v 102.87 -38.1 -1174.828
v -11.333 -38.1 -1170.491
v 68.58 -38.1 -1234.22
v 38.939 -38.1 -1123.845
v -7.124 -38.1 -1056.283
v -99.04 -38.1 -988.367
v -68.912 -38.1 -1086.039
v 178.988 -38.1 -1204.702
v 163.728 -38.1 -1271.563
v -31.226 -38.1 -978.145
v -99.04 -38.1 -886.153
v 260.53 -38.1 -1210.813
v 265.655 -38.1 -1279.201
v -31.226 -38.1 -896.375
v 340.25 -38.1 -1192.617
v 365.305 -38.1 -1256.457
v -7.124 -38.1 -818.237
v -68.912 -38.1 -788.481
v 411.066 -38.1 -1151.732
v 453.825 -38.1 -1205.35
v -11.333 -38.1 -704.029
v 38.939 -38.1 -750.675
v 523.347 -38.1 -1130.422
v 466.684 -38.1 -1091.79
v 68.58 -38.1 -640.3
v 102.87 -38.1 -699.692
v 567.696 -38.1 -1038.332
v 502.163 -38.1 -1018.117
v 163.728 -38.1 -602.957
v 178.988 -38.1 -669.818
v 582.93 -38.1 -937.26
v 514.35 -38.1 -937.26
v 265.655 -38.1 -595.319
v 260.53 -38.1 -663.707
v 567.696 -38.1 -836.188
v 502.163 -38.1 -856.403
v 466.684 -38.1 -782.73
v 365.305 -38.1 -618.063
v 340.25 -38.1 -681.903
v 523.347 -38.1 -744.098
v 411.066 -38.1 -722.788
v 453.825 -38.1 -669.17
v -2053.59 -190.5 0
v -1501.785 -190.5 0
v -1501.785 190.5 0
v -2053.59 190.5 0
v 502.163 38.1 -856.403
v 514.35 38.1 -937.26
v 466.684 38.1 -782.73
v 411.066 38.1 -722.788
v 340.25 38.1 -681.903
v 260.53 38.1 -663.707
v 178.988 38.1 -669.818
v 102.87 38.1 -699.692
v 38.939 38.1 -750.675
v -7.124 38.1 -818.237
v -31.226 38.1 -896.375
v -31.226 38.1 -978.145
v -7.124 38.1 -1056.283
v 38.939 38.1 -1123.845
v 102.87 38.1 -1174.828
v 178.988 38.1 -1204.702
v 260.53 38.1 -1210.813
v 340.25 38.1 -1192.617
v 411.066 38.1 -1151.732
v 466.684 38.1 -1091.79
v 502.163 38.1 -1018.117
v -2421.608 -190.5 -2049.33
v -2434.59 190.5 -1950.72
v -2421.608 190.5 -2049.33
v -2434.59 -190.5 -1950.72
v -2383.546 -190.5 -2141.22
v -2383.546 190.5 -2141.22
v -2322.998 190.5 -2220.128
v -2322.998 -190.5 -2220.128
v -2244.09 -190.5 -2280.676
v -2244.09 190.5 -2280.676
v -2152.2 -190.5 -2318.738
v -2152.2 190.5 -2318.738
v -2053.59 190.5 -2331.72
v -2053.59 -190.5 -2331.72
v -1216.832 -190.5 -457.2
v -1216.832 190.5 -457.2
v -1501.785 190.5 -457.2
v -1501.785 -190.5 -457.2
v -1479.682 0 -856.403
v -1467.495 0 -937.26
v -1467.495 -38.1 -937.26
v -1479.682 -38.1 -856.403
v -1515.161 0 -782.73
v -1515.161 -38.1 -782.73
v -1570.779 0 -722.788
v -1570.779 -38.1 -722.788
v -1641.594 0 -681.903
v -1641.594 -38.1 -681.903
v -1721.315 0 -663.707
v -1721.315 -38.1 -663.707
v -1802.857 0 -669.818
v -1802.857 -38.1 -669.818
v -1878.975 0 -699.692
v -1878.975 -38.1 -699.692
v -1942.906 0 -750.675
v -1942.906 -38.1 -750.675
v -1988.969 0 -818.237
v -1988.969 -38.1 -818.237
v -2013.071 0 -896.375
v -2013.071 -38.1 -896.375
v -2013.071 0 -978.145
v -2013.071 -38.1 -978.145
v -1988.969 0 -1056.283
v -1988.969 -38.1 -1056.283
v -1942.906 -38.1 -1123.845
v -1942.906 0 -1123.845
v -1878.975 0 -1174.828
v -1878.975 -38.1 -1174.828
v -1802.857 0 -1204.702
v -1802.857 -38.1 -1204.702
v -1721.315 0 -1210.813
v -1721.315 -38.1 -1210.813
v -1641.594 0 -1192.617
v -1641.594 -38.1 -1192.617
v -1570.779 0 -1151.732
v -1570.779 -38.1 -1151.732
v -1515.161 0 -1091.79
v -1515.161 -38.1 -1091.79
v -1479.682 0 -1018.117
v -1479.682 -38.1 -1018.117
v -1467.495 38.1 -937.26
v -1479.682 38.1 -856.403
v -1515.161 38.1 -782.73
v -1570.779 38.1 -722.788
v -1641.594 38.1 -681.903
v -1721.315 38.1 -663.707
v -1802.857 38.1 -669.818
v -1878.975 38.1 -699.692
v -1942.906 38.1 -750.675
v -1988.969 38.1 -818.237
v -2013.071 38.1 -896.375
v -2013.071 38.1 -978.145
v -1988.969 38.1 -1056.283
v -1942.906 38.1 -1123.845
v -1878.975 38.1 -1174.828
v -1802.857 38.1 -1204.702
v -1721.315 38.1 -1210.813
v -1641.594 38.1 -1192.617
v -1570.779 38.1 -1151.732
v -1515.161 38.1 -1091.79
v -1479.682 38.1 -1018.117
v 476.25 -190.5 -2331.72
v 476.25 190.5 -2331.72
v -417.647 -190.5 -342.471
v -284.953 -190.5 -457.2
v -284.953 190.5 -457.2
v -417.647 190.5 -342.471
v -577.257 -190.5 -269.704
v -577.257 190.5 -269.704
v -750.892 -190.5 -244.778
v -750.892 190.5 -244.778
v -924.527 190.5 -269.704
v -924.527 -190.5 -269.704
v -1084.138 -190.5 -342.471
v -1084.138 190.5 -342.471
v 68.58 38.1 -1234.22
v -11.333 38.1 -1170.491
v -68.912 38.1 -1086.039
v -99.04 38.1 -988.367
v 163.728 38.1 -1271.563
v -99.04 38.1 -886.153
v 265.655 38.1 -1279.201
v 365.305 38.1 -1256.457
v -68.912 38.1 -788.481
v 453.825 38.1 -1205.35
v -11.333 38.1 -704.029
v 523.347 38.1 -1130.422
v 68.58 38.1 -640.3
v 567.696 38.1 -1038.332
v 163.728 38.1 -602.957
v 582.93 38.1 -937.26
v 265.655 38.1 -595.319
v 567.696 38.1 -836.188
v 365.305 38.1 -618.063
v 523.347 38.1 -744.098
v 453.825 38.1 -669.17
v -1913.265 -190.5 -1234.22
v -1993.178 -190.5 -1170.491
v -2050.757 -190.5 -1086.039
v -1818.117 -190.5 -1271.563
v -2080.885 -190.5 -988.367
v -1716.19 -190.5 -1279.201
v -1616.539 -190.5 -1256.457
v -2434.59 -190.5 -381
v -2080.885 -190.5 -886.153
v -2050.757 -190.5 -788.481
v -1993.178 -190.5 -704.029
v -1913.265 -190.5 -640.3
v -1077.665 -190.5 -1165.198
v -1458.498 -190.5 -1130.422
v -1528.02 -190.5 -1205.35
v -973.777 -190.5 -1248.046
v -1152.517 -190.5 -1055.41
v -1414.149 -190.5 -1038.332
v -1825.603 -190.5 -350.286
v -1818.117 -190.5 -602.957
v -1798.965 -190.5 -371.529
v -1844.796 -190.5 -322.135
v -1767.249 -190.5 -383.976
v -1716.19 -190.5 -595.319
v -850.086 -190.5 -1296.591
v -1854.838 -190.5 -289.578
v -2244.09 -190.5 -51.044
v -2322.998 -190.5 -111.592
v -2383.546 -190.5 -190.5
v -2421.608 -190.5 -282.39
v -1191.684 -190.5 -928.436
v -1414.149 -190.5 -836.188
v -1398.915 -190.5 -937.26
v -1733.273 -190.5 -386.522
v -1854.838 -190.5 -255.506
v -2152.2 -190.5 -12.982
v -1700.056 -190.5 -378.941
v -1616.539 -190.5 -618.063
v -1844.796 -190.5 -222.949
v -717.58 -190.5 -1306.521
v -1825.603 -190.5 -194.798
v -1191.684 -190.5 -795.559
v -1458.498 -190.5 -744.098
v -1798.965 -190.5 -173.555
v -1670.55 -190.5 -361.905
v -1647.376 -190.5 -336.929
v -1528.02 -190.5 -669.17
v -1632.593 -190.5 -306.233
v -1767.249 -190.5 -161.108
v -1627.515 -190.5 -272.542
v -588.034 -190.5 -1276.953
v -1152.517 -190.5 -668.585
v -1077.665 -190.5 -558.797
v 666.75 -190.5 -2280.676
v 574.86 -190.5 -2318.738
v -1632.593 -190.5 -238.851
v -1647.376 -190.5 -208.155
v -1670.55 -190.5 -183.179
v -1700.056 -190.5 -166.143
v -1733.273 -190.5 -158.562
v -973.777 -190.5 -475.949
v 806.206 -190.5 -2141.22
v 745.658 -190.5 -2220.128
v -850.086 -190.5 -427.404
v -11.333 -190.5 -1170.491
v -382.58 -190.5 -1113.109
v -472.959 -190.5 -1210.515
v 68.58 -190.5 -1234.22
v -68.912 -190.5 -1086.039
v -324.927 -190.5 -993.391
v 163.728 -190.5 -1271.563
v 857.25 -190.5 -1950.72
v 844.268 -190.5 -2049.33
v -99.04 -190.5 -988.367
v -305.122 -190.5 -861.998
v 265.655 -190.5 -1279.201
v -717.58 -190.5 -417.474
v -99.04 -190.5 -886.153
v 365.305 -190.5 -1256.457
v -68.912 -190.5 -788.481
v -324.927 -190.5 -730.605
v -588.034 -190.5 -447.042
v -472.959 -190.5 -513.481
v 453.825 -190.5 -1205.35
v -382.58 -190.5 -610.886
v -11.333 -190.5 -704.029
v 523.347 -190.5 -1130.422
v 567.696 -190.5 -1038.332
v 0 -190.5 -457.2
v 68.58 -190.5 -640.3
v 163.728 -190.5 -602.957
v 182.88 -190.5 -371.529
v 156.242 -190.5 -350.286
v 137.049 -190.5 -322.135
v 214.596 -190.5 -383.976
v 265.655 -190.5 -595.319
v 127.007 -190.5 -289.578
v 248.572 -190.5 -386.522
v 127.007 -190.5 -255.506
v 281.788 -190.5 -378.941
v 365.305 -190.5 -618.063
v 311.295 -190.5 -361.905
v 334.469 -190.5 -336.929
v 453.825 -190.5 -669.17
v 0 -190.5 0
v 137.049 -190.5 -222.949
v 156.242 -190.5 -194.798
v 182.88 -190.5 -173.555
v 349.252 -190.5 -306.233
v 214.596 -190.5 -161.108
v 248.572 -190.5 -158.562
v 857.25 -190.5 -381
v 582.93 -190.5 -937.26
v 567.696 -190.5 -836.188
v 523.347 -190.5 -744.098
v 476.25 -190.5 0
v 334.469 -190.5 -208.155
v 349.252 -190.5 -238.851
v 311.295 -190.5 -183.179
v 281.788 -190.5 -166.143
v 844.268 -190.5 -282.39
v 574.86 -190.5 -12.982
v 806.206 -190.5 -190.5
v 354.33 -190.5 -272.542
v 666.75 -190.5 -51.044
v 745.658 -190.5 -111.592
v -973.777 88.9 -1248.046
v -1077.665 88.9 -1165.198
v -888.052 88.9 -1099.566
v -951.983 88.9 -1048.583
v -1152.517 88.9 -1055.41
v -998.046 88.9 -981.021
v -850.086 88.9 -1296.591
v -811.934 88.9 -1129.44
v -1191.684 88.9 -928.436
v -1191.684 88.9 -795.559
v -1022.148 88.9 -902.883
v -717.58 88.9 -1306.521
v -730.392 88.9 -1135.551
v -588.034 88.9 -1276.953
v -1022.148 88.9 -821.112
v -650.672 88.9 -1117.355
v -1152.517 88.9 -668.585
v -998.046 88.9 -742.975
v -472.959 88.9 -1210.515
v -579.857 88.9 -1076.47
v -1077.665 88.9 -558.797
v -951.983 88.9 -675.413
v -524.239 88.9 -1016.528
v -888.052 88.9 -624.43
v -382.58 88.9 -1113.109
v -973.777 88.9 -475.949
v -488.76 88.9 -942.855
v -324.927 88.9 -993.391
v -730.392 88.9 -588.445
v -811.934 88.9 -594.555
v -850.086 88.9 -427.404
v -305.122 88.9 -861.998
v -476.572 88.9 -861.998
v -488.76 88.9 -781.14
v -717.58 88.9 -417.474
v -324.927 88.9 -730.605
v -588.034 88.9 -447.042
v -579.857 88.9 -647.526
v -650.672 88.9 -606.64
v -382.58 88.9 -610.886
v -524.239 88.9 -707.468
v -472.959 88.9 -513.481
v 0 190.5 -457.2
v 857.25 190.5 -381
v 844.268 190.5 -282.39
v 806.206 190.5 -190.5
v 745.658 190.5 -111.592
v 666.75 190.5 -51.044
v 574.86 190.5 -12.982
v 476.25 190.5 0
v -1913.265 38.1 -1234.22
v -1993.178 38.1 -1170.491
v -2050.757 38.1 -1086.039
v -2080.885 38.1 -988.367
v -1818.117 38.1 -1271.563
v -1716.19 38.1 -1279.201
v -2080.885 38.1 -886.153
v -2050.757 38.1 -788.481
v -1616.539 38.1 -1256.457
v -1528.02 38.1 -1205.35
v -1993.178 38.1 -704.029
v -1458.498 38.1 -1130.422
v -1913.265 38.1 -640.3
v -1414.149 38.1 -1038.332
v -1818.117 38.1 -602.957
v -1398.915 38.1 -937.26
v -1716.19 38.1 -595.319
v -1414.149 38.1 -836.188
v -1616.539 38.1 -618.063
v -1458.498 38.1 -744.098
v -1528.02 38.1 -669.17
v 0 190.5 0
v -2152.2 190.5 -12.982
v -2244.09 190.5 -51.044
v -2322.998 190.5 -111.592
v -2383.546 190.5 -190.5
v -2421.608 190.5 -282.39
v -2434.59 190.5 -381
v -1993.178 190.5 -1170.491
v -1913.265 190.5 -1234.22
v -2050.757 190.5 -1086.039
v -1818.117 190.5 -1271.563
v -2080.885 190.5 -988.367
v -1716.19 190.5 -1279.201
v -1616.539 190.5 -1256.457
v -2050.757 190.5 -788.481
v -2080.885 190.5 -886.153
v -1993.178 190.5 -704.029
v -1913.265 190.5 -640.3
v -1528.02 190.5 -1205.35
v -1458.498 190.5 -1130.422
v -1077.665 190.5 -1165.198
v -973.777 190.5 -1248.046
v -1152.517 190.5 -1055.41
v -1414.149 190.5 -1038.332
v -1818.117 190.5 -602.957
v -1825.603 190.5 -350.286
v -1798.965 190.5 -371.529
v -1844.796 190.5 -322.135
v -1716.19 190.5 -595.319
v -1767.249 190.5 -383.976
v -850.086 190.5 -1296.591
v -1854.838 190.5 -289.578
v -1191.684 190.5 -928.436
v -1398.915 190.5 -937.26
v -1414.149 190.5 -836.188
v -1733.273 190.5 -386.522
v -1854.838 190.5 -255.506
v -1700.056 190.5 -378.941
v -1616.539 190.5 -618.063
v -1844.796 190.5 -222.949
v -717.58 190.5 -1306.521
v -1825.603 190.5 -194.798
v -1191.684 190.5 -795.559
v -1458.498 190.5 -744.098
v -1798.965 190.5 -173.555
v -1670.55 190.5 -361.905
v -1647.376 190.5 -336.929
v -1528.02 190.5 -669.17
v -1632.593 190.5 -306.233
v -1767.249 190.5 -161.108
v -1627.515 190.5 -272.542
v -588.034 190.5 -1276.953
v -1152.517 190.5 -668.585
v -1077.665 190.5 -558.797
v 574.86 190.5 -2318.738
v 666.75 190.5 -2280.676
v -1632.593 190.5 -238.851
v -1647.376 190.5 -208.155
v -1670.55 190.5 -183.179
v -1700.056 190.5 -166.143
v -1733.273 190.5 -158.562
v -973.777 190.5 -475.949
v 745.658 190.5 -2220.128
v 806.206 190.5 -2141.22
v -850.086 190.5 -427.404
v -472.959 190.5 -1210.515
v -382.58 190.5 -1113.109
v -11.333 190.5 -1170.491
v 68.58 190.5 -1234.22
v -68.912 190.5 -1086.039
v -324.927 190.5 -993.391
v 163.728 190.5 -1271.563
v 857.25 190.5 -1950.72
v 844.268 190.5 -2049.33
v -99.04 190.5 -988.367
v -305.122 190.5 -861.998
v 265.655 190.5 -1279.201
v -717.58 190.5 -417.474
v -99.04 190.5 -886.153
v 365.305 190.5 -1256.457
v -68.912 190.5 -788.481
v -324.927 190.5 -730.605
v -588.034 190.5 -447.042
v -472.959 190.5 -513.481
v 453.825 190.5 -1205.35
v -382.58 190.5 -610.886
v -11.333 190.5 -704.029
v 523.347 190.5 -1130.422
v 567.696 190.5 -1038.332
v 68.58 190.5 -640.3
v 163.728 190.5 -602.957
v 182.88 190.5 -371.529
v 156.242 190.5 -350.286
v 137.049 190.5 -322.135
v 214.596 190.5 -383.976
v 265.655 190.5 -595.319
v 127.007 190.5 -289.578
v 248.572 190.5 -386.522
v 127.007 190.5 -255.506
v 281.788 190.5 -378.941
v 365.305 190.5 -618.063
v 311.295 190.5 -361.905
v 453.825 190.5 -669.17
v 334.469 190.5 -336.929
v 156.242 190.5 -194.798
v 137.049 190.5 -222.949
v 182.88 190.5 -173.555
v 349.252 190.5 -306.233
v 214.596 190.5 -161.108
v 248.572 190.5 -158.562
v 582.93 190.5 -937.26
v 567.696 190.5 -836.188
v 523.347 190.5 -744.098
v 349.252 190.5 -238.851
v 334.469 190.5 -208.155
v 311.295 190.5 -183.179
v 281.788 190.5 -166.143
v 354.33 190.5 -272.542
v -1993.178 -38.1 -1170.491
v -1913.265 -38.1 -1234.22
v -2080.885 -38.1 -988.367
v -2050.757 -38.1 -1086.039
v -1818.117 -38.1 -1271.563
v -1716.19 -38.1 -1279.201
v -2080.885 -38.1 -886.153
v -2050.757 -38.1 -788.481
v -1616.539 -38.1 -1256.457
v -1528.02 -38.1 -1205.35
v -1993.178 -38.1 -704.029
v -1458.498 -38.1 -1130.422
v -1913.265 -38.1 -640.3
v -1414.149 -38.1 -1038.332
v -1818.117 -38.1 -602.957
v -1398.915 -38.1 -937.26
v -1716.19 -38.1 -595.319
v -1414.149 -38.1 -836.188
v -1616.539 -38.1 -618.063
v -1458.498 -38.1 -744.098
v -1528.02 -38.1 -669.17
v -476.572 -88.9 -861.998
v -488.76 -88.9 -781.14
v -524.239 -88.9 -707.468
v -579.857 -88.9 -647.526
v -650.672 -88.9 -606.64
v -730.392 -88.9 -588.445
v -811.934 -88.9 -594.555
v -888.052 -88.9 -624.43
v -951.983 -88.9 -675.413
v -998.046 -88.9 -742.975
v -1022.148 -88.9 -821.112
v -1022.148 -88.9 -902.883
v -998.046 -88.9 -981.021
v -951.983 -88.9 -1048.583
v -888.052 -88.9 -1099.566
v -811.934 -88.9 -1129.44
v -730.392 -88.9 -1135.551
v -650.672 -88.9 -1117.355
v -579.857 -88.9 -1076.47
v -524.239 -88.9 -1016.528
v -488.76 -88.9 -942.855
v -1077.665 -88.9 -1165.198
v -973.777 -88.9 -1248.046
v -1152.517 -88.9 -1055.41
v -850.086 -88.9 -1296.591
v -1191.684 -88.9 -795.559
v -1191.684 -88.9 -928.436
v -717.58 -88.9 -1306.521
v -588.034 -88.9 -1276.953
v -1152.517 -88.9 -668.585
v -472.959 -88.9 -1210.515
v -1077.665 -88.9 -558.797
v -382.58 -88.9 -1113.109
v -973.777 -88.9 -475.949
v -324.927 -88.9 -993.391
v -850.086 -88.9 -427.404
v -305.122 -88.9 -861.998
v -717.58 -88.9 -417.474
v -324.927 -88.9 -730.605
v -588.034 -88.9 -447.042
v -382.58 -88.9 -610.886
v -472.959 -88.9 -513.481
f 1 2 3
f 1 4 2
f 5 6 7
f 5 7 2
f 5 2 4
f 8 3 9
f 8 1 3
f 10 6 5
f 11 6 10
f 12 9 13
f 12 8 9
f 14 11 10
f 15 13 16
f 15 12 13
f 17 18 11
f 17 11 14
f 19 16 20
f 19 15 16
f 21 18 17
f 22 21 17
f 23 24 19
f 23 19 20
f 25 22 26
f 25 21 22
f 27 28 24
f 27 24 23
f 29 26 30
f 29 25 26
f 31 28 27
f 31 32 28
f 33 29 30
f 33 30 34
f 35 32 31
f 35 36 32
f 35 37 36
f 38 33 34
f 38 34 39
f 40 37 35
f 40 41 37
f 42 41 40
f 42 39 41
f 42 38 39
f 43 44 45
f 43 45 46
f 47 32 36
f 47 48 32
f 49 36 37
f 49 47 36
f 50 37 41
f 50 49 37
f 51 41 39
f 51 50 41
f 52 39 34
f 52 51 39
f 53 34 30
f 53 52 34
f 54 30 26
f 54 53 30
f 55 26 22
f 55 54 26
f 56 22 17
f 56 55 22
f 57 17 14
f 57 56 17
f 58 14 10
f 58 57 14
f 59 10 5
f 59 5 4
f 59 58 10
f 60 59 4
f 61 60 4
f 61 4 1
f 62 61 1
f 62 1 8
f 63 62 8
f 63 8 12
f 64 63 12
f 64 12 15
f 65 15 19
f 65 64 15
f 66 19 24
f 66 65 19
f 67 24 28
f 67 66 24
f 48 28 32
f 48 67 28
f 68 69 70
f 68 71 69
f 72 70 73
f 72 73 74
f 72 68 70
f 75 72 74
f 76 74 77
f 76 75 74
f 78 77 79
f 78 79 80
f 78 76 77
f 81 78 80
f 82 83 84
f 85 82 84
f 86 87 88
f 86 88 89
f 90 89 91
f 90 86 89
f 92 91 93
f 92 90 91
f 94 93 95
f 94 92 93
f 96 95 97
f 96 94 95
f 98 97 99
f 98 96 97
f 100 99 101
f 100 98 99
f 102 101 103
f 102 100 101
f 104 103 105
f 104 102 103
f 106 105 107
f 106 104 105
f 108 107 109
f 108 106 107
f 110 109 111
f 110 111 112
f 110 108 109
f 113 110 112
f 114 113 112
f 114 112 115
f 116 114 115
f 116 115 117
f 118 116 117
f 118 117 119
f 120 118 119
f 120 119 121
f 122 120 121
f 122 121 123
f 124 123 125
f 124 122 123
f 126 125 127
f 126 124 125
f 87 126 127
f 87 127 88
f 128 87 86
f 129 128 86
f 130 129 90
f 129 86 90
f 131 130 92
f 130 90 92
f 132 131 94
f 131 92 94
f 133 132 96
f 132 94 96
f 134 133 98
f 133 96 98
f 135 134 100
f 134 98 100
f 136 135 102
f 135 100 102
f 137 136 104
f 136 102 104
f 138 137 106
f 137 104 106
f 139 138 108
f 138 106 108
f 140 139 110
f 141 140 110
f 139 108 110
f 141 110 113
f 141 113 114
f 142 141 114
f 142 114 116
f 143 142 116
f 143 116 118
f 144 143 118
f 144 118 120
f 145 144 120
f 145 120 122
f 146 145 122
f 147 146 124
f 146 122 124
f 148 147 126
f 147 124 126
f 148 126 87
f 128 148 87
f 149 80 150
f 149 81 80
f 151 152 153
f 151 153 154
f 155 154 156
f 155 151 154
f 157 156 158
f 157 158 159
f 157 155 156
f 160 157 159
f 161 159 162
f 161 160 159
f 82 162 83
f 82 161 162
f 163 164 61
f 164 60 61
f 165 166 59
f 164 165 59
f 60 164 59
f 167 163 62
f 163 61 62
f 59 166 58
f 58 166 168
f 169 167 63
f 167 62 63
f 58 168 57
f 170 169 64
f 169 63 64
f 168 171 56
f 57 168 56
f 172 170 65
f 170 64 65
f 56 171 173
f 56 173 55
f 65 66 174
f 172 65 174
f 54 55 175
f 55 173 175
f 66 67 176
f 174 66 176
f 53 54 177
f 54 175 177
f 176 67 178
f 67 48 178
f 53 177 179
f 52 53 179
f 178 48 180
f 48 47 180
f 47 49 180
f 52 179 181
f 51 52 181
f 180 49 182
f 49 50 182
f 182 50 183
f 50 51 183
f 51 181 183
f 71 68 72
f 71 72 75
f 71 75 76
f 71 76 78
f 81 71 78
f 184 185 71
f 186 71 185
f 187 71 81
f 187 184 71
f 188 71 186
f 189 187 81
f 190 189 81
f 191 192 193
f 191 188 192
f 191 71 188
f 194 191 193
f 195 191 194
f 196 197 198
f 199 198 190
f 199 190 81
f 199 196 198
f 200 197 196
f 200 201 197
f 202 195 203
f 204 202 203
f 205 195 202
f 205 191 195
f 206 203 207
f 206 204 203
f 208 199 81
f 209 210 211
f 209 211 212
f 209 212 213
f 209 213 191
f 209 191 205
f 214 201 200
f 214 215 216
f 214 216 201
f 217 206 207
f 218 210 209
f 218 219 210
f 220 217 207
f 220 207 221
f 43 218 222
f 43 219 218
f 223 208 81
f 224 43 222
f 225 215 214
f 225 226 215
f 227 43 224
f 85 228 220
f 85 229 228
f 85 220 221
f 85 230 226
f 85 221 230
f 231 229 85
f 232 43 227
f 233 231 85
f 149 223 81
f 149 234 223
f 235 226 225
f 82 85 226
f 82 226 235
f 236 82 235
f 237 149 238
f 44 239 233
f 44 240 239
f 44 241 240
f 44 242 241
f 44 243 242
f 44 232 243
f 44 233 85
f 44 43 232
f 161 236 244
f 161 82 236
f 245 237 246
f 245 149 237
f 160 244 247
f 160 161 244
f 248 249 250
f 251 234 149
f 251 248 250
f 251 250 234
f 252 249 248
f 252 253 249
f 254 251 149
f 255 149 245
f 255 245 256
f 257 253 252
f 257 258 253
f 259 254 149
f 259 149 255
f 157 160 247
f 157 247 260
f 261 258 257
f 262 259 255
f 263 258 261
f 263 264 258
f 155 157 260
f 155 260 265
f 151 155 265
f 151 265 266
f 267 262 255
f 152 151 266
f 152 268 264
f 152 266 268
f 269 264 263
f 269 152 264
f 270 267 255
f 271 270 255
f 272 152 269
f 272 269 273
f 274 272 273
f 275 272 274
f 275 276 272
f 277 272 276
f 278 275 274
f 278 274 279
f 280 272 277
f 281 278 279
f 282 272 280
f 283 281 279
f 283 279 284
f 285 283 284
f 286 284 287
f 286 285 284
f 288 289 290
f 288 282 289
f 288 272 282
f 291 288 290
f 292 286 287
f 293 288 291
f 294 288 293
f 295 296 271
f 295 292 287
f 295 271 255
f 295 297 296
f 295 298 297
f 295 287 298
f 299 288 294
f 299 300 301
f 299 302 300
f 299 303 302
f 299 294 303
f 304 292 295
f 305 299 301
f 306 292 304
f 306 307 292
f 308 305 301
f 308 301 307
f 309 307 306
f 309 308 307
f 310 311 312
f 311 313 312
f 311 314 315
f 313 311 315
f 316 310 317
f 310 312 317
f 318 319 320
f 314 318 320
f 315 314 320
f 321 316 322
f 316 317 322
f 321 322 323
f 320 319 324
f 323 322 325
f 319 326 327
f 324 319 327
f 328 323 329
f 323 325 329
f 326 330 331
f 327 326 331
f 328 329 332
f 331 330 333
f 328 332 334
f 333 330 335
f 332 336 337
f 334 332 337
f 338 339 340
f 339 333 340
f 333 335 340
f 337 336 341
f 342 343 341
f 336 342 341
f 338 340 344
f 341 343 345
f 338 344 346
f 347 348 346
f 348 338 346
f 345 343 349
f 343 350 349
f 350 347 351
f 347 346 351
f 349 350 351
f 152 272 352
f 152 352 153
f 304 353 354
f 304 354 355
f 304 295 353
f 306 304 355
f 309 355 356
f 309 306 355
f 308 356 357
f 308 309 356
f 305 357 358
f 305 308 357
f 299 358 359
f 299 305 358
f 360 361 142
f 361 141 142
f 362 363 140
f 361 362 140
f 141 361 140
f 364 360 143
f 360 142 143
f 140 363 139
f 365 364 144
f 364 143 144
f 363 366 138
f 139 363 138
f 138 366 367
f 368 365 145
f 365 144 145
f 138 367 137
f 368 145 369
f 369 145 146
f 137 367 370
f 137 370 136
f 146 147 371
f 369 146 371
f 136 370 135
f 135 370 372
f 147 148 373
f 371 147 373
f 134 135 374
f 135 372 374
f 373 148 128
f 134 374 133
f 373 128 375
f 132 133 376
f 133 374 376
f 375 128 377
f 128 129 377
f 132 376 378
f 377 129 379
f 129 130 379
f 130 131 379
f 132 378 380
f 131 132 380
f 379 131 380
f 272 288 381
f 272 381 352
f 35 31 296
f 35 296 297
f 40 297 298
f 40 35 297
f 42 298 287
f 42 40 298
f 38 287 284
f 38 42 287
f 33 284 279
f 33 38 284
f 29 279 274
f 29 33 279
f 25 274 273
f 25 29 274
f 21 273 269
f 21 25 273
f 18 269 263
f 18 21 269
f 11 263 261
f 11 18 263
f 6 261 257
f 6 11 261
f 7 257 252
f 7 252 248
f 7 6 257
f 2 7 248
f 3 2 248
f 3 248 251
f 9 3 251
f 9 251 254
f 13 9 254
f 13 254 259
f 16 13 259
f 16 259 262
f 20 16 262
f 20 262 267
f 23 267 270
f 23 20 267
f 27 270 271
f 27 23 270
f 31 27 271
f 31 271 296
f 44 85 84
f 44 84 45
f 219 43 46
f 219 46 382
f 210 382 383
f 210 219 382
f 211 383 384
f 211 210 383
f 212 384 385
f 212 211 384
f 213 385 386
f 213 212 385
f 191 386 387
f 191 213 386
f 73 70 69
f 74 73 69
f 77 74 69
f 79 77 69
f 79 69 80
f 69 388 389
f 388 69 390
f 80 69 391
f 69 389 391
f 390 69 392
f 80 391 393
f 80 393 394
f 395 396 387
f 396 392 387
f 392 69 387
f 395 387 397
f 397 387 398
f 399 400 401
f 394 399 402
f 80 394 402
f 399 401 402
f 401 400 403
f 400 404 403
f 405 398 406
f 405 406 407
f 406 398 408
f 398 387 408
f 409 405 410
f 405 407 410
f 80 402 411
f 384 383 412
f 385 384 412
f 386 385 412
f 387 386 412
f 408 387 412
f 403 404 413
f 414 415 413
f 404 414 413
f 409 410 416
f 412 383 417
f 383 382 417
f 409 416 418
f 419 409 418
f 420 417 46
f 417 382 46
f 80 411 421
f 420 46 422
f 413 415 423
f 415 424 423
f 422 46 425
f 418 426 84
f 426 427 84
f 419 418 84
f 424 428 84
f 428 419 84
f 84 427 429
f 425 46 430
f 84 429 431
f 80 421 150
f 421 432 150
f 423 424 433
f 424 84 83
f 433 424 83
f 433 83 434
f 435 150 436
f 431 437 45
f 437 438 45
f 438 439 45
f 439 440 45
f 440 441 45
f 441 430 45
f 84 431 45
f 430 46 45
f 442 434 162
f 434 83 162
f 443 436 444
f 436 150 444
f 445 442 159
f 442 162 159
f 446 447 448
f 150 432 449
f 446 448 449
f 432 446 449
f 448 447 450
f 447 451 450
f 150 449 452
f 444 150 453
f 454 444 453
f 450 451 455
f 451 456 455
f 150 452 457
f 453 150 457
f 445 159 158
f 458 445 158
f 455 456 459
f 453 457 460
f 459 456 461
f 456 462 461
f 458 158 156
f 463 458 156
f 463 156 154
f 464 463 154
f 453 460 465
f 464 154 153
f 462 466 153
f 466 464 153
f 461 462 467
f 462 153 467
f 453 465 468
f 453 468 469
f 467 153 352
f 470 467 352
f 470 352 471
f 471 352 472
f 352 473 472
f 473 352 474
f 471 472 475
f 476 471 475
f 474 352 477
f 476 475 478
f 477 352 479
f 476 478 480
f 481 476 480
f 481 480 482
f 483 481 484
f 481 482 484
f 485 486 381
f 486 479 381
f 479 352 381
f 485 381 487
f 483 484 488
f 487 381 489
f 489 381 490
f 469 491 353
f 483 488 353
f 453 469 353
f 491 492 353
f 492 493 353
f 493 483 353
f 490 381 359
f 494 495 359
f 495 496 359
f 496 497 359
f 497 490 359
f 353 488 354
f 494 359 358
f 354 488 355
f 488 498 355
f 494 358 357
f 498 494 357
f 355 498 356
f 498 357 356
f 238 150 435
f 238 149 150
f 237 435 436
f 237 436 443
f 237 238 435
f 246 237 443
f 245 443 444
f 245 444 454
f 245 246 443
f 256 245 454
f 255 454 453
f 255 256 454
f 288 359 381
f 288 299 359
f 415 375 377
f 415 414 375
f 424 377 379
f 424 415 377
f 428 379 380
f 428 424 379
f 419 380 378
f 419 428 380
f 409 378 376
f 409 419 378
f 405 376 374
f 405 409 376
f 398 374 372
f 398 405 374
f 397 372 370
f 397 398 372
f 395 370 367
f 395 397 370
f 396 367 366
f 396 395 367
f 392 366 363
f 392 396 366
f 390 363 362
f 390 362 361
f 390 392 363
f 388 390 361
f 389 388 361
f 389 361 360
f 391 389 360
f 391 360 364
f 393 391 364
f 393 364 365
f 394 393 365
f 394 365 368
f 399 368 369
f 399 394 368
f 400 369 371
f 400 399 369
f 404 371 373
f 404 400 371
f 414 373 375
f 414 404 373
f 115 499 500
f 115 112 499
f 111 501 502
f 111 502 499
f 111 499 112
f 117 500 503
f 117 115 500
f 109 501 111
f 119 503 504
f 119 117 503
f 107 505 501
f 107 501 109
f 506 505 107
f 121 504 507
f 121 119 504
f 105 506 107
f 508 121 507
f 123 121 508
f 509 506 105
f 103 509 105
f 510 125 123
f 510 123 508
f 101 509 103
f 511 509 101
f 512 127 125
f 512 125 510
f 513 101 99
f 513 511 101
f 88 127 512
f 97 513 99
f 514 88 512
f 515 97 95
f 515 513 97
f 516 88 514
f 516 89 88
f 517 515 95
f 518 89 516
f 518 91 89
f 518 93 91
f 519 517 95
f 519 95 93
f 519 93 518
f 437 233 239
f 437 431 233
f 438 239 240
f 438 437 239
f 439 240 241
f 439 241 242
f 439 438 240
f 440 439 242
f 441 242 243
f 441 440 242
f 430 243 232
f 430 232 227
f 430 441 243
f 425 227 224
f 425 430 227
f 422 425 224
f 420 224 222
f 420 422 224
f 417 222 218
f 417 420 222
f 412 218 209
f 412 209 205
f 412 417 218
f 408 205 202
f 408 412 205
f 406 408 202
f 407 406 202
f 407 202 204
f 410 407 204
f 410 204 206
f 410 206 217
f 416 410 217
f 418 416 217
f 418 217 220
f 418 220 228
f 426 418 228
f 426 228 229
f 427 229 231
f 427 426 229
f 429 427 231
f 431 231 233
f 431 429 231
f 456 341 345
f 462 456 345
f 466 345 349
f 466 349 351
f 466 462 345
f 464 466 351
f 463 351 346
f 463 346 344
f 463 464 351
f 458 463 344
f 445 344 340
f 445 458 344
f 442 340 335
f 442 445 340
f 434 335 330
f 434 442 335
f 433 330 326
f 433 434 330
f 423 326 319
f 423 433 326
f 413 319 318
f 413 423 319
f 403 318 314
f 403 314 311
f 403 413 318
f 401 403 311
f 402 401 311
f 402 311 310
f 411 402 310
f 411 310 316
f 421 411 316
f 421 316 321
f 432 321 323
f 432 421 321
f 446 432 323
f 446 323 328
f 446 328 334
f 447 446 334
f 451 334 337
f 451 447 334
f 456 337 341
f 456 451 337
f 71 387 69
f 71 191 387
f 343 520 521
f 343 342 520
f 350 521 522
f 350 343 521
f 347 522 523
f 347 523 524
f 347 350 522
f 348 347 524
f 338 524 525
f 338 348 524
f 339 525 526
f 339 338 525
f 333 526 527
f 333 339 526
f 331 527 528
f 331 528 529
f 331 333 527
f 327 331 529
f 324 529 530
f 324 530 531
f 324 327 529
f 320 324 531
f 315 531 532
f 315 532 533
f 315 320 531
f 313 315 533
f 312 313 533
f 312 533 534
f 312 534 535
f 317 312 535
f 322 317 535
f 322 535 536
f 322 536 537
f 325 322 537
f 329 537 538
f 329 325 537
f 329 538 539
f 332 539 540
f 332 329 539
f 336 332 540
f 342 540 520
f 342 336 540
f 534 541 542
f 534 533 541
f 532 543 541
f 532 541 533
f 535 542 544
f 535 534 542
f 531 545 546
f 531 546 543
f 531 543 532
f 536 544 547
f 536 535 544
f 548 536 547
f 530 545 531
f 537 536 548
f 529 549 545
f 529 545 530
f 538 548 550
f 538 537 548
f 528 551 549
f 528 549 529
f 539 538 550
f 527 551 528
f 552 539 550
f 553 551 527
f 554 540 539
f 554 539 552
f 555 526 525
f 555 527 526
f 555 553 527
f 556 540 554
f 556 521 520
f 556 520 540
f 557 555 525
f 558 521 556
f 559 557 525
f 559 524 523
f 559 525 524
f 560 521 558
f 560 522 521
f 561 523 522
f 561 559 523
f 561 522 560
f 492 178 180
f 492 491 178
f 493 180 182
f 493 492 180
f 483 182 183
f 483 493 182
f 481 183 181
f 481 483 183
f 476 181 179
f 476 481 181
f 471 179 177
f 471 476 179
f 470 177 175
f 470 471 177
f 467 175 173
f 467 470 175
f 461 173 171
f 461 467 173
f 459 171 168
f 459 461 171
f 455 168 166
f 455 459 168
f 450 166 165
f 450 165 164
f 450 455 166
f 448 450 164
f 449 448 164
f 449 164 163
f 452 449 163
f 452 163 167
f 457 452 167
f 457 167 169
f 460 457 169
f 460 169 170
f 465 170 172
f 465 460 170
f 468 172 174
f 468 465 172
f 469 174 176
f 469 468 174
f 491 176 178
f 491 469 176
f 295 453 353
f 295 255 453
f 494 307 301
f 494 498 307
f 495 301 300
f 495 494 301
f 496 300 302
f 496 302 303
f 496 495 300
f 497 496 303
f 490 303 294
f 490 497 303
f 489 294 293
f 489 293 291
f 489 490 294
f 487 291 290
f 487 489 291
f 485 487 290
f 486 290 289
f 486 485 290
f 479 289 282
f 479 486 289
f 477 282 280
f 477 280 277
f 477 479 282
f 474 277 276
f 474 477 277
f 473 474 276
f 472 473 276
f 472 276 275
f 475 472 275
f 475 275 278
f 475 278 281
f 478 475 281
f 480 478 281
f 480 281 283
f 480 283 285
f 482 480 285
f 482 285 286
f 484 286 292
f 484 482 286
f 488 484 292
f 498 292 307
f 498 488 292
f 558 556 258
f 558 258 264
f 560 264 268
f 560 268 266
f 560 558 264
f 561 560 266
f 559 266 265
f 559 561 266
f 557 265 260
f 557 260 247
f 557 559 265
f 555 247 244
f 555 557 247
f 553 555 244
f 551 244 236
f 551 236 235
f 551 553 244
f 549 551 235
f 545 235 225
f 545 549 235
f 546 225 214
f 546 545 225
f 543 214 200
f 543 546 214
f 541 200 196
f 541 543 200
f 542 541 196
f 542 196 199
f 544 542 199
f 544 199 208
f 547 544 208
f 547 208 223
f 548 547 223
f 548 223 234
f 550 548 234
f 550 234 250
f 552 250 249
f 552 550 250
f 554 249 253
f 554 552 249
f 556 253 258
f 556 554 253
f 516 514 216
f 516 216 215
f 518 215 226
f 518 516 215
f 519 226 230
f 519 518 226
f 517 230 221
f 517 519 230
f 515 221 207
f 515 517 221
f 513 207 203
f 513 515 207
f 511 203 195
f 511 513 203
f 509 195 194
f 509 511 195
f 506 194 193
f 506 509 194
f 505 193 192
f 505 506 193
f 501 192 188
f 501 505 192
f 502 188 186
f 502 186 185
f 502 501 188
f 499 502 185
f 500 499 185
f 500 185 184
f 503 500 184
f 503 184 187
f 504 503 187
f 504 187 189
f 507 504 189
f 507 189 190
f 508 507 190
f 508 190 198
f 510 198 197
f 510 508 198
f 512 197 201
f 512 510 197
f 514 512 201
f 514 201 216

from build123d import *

# Parameters (mm, degrees)
F0_R     = 342.9
F0_R_2   = 114.3
F0_R_3   = 445.77
F1_DEPTH = 190.5
F0_R_4   = 274.32
F2_DEPTH = 88.9
F3_DEPTH = 38.1


with BuildPart() as f1:
    # F0 (on Front) → F1 (new body, symmetric)
    with BuildSketch(Plane.XZ):
        with BuildLine():
            Line((476.25, 0), (0, 0))
            Line((0, 0), (0, -457.2))
            Line((0, -457.2), (-284.9531043775, -457.2))
            ThreePointArc((-284.9531043775, -457.2), (-750.8924007416, -244.7776043701), (-1216.8316971056, -457.2))
            Line((-1216.8316971056, -457.2), (-1501.7848014832, -457.2))
            Line((-1501.7848014832, -457.2), (-1501.7848014832, 0))
            Line((-1501.7848014832, 0), (-2053.59, 0))
            ThreePointArc((-2053.59, 0), (-2322.9976836321, -111.5923163679), (-2434.59, -381))
            Line((-2434.59, -381), (-2434.59, -1950.72))
            ThreePointArc((-2434.59, -1950.72), (-2322.9976836321, -2220.1276836321), (-2053.59, -2331.72))
            Line((-2053.59, -2331.72), (476.25, -2331.72))
            ThreePointArc((476.25, -2331.72), (745.6576836321, -2220.1276836321), (857.25, -1950.72))
            Line((857.25, -1950.72), (857.25, -381))
            ThreePointArc((857.25, -381), (745.6576836321, -111.5923163679), (476.25, 0))
        make_face()
        with Locations((-1741.8148014832, -937.26)):
            Circle(F0_R, mode=Mode.SUBTRACT)
        with Locations((-1741.8148014832, -272.542)):
            Circle(F0_R_2, mode=Mode.SUBTRACT)
        with Locations((-750.8924007416, -861.9976043701)):
            Circle(F0_R_3, mode=Mode.SUBTRACT)
        with Locations((240.03, -937.26)):
            Circle(F0_R, mode=Mode.SUBTRACT)
        with Locations((240.03, -272.542)):
            Circle(F0_R_2, mode=Mode.SUBTRACT)
    extrude(amount=F1_DEPTH, both=True)

    # F0 (on Front) → F2 (join, symmetric)
    with BuildSketch(Plane.XZ):
        with Locations((-750.8924007416, -861.9976043701)):
            Circle(F0_R_3)
        with Locations((-750.8924007416, -861.9976043701)):
            Circle(F0_R_4, mode=Mode.SUBTRACT)
    extrude(amount=F2_DEPTH, both=True)

    # F0 (on Front) → F3 (join, symmetric)
    with BuildSketch(Plane.XZ):
        with Locations((-1741.8148014832, -937.26)):
            Circle(F0_R)
        with Locations((-1741.8148014832, -937.26)):
            Circle(F0_R_4, mode=Mode.SUBTRACT)
        with Locations((240.03, -937.26)):
            Circle(F0_R)
        with Locations((240.03, -937.26)):
            Circle(F0_R_4, mode=Mode.SUBTRACT)
    extrude(amount=F3_DEPTH, both=True)


solid = f1.part
